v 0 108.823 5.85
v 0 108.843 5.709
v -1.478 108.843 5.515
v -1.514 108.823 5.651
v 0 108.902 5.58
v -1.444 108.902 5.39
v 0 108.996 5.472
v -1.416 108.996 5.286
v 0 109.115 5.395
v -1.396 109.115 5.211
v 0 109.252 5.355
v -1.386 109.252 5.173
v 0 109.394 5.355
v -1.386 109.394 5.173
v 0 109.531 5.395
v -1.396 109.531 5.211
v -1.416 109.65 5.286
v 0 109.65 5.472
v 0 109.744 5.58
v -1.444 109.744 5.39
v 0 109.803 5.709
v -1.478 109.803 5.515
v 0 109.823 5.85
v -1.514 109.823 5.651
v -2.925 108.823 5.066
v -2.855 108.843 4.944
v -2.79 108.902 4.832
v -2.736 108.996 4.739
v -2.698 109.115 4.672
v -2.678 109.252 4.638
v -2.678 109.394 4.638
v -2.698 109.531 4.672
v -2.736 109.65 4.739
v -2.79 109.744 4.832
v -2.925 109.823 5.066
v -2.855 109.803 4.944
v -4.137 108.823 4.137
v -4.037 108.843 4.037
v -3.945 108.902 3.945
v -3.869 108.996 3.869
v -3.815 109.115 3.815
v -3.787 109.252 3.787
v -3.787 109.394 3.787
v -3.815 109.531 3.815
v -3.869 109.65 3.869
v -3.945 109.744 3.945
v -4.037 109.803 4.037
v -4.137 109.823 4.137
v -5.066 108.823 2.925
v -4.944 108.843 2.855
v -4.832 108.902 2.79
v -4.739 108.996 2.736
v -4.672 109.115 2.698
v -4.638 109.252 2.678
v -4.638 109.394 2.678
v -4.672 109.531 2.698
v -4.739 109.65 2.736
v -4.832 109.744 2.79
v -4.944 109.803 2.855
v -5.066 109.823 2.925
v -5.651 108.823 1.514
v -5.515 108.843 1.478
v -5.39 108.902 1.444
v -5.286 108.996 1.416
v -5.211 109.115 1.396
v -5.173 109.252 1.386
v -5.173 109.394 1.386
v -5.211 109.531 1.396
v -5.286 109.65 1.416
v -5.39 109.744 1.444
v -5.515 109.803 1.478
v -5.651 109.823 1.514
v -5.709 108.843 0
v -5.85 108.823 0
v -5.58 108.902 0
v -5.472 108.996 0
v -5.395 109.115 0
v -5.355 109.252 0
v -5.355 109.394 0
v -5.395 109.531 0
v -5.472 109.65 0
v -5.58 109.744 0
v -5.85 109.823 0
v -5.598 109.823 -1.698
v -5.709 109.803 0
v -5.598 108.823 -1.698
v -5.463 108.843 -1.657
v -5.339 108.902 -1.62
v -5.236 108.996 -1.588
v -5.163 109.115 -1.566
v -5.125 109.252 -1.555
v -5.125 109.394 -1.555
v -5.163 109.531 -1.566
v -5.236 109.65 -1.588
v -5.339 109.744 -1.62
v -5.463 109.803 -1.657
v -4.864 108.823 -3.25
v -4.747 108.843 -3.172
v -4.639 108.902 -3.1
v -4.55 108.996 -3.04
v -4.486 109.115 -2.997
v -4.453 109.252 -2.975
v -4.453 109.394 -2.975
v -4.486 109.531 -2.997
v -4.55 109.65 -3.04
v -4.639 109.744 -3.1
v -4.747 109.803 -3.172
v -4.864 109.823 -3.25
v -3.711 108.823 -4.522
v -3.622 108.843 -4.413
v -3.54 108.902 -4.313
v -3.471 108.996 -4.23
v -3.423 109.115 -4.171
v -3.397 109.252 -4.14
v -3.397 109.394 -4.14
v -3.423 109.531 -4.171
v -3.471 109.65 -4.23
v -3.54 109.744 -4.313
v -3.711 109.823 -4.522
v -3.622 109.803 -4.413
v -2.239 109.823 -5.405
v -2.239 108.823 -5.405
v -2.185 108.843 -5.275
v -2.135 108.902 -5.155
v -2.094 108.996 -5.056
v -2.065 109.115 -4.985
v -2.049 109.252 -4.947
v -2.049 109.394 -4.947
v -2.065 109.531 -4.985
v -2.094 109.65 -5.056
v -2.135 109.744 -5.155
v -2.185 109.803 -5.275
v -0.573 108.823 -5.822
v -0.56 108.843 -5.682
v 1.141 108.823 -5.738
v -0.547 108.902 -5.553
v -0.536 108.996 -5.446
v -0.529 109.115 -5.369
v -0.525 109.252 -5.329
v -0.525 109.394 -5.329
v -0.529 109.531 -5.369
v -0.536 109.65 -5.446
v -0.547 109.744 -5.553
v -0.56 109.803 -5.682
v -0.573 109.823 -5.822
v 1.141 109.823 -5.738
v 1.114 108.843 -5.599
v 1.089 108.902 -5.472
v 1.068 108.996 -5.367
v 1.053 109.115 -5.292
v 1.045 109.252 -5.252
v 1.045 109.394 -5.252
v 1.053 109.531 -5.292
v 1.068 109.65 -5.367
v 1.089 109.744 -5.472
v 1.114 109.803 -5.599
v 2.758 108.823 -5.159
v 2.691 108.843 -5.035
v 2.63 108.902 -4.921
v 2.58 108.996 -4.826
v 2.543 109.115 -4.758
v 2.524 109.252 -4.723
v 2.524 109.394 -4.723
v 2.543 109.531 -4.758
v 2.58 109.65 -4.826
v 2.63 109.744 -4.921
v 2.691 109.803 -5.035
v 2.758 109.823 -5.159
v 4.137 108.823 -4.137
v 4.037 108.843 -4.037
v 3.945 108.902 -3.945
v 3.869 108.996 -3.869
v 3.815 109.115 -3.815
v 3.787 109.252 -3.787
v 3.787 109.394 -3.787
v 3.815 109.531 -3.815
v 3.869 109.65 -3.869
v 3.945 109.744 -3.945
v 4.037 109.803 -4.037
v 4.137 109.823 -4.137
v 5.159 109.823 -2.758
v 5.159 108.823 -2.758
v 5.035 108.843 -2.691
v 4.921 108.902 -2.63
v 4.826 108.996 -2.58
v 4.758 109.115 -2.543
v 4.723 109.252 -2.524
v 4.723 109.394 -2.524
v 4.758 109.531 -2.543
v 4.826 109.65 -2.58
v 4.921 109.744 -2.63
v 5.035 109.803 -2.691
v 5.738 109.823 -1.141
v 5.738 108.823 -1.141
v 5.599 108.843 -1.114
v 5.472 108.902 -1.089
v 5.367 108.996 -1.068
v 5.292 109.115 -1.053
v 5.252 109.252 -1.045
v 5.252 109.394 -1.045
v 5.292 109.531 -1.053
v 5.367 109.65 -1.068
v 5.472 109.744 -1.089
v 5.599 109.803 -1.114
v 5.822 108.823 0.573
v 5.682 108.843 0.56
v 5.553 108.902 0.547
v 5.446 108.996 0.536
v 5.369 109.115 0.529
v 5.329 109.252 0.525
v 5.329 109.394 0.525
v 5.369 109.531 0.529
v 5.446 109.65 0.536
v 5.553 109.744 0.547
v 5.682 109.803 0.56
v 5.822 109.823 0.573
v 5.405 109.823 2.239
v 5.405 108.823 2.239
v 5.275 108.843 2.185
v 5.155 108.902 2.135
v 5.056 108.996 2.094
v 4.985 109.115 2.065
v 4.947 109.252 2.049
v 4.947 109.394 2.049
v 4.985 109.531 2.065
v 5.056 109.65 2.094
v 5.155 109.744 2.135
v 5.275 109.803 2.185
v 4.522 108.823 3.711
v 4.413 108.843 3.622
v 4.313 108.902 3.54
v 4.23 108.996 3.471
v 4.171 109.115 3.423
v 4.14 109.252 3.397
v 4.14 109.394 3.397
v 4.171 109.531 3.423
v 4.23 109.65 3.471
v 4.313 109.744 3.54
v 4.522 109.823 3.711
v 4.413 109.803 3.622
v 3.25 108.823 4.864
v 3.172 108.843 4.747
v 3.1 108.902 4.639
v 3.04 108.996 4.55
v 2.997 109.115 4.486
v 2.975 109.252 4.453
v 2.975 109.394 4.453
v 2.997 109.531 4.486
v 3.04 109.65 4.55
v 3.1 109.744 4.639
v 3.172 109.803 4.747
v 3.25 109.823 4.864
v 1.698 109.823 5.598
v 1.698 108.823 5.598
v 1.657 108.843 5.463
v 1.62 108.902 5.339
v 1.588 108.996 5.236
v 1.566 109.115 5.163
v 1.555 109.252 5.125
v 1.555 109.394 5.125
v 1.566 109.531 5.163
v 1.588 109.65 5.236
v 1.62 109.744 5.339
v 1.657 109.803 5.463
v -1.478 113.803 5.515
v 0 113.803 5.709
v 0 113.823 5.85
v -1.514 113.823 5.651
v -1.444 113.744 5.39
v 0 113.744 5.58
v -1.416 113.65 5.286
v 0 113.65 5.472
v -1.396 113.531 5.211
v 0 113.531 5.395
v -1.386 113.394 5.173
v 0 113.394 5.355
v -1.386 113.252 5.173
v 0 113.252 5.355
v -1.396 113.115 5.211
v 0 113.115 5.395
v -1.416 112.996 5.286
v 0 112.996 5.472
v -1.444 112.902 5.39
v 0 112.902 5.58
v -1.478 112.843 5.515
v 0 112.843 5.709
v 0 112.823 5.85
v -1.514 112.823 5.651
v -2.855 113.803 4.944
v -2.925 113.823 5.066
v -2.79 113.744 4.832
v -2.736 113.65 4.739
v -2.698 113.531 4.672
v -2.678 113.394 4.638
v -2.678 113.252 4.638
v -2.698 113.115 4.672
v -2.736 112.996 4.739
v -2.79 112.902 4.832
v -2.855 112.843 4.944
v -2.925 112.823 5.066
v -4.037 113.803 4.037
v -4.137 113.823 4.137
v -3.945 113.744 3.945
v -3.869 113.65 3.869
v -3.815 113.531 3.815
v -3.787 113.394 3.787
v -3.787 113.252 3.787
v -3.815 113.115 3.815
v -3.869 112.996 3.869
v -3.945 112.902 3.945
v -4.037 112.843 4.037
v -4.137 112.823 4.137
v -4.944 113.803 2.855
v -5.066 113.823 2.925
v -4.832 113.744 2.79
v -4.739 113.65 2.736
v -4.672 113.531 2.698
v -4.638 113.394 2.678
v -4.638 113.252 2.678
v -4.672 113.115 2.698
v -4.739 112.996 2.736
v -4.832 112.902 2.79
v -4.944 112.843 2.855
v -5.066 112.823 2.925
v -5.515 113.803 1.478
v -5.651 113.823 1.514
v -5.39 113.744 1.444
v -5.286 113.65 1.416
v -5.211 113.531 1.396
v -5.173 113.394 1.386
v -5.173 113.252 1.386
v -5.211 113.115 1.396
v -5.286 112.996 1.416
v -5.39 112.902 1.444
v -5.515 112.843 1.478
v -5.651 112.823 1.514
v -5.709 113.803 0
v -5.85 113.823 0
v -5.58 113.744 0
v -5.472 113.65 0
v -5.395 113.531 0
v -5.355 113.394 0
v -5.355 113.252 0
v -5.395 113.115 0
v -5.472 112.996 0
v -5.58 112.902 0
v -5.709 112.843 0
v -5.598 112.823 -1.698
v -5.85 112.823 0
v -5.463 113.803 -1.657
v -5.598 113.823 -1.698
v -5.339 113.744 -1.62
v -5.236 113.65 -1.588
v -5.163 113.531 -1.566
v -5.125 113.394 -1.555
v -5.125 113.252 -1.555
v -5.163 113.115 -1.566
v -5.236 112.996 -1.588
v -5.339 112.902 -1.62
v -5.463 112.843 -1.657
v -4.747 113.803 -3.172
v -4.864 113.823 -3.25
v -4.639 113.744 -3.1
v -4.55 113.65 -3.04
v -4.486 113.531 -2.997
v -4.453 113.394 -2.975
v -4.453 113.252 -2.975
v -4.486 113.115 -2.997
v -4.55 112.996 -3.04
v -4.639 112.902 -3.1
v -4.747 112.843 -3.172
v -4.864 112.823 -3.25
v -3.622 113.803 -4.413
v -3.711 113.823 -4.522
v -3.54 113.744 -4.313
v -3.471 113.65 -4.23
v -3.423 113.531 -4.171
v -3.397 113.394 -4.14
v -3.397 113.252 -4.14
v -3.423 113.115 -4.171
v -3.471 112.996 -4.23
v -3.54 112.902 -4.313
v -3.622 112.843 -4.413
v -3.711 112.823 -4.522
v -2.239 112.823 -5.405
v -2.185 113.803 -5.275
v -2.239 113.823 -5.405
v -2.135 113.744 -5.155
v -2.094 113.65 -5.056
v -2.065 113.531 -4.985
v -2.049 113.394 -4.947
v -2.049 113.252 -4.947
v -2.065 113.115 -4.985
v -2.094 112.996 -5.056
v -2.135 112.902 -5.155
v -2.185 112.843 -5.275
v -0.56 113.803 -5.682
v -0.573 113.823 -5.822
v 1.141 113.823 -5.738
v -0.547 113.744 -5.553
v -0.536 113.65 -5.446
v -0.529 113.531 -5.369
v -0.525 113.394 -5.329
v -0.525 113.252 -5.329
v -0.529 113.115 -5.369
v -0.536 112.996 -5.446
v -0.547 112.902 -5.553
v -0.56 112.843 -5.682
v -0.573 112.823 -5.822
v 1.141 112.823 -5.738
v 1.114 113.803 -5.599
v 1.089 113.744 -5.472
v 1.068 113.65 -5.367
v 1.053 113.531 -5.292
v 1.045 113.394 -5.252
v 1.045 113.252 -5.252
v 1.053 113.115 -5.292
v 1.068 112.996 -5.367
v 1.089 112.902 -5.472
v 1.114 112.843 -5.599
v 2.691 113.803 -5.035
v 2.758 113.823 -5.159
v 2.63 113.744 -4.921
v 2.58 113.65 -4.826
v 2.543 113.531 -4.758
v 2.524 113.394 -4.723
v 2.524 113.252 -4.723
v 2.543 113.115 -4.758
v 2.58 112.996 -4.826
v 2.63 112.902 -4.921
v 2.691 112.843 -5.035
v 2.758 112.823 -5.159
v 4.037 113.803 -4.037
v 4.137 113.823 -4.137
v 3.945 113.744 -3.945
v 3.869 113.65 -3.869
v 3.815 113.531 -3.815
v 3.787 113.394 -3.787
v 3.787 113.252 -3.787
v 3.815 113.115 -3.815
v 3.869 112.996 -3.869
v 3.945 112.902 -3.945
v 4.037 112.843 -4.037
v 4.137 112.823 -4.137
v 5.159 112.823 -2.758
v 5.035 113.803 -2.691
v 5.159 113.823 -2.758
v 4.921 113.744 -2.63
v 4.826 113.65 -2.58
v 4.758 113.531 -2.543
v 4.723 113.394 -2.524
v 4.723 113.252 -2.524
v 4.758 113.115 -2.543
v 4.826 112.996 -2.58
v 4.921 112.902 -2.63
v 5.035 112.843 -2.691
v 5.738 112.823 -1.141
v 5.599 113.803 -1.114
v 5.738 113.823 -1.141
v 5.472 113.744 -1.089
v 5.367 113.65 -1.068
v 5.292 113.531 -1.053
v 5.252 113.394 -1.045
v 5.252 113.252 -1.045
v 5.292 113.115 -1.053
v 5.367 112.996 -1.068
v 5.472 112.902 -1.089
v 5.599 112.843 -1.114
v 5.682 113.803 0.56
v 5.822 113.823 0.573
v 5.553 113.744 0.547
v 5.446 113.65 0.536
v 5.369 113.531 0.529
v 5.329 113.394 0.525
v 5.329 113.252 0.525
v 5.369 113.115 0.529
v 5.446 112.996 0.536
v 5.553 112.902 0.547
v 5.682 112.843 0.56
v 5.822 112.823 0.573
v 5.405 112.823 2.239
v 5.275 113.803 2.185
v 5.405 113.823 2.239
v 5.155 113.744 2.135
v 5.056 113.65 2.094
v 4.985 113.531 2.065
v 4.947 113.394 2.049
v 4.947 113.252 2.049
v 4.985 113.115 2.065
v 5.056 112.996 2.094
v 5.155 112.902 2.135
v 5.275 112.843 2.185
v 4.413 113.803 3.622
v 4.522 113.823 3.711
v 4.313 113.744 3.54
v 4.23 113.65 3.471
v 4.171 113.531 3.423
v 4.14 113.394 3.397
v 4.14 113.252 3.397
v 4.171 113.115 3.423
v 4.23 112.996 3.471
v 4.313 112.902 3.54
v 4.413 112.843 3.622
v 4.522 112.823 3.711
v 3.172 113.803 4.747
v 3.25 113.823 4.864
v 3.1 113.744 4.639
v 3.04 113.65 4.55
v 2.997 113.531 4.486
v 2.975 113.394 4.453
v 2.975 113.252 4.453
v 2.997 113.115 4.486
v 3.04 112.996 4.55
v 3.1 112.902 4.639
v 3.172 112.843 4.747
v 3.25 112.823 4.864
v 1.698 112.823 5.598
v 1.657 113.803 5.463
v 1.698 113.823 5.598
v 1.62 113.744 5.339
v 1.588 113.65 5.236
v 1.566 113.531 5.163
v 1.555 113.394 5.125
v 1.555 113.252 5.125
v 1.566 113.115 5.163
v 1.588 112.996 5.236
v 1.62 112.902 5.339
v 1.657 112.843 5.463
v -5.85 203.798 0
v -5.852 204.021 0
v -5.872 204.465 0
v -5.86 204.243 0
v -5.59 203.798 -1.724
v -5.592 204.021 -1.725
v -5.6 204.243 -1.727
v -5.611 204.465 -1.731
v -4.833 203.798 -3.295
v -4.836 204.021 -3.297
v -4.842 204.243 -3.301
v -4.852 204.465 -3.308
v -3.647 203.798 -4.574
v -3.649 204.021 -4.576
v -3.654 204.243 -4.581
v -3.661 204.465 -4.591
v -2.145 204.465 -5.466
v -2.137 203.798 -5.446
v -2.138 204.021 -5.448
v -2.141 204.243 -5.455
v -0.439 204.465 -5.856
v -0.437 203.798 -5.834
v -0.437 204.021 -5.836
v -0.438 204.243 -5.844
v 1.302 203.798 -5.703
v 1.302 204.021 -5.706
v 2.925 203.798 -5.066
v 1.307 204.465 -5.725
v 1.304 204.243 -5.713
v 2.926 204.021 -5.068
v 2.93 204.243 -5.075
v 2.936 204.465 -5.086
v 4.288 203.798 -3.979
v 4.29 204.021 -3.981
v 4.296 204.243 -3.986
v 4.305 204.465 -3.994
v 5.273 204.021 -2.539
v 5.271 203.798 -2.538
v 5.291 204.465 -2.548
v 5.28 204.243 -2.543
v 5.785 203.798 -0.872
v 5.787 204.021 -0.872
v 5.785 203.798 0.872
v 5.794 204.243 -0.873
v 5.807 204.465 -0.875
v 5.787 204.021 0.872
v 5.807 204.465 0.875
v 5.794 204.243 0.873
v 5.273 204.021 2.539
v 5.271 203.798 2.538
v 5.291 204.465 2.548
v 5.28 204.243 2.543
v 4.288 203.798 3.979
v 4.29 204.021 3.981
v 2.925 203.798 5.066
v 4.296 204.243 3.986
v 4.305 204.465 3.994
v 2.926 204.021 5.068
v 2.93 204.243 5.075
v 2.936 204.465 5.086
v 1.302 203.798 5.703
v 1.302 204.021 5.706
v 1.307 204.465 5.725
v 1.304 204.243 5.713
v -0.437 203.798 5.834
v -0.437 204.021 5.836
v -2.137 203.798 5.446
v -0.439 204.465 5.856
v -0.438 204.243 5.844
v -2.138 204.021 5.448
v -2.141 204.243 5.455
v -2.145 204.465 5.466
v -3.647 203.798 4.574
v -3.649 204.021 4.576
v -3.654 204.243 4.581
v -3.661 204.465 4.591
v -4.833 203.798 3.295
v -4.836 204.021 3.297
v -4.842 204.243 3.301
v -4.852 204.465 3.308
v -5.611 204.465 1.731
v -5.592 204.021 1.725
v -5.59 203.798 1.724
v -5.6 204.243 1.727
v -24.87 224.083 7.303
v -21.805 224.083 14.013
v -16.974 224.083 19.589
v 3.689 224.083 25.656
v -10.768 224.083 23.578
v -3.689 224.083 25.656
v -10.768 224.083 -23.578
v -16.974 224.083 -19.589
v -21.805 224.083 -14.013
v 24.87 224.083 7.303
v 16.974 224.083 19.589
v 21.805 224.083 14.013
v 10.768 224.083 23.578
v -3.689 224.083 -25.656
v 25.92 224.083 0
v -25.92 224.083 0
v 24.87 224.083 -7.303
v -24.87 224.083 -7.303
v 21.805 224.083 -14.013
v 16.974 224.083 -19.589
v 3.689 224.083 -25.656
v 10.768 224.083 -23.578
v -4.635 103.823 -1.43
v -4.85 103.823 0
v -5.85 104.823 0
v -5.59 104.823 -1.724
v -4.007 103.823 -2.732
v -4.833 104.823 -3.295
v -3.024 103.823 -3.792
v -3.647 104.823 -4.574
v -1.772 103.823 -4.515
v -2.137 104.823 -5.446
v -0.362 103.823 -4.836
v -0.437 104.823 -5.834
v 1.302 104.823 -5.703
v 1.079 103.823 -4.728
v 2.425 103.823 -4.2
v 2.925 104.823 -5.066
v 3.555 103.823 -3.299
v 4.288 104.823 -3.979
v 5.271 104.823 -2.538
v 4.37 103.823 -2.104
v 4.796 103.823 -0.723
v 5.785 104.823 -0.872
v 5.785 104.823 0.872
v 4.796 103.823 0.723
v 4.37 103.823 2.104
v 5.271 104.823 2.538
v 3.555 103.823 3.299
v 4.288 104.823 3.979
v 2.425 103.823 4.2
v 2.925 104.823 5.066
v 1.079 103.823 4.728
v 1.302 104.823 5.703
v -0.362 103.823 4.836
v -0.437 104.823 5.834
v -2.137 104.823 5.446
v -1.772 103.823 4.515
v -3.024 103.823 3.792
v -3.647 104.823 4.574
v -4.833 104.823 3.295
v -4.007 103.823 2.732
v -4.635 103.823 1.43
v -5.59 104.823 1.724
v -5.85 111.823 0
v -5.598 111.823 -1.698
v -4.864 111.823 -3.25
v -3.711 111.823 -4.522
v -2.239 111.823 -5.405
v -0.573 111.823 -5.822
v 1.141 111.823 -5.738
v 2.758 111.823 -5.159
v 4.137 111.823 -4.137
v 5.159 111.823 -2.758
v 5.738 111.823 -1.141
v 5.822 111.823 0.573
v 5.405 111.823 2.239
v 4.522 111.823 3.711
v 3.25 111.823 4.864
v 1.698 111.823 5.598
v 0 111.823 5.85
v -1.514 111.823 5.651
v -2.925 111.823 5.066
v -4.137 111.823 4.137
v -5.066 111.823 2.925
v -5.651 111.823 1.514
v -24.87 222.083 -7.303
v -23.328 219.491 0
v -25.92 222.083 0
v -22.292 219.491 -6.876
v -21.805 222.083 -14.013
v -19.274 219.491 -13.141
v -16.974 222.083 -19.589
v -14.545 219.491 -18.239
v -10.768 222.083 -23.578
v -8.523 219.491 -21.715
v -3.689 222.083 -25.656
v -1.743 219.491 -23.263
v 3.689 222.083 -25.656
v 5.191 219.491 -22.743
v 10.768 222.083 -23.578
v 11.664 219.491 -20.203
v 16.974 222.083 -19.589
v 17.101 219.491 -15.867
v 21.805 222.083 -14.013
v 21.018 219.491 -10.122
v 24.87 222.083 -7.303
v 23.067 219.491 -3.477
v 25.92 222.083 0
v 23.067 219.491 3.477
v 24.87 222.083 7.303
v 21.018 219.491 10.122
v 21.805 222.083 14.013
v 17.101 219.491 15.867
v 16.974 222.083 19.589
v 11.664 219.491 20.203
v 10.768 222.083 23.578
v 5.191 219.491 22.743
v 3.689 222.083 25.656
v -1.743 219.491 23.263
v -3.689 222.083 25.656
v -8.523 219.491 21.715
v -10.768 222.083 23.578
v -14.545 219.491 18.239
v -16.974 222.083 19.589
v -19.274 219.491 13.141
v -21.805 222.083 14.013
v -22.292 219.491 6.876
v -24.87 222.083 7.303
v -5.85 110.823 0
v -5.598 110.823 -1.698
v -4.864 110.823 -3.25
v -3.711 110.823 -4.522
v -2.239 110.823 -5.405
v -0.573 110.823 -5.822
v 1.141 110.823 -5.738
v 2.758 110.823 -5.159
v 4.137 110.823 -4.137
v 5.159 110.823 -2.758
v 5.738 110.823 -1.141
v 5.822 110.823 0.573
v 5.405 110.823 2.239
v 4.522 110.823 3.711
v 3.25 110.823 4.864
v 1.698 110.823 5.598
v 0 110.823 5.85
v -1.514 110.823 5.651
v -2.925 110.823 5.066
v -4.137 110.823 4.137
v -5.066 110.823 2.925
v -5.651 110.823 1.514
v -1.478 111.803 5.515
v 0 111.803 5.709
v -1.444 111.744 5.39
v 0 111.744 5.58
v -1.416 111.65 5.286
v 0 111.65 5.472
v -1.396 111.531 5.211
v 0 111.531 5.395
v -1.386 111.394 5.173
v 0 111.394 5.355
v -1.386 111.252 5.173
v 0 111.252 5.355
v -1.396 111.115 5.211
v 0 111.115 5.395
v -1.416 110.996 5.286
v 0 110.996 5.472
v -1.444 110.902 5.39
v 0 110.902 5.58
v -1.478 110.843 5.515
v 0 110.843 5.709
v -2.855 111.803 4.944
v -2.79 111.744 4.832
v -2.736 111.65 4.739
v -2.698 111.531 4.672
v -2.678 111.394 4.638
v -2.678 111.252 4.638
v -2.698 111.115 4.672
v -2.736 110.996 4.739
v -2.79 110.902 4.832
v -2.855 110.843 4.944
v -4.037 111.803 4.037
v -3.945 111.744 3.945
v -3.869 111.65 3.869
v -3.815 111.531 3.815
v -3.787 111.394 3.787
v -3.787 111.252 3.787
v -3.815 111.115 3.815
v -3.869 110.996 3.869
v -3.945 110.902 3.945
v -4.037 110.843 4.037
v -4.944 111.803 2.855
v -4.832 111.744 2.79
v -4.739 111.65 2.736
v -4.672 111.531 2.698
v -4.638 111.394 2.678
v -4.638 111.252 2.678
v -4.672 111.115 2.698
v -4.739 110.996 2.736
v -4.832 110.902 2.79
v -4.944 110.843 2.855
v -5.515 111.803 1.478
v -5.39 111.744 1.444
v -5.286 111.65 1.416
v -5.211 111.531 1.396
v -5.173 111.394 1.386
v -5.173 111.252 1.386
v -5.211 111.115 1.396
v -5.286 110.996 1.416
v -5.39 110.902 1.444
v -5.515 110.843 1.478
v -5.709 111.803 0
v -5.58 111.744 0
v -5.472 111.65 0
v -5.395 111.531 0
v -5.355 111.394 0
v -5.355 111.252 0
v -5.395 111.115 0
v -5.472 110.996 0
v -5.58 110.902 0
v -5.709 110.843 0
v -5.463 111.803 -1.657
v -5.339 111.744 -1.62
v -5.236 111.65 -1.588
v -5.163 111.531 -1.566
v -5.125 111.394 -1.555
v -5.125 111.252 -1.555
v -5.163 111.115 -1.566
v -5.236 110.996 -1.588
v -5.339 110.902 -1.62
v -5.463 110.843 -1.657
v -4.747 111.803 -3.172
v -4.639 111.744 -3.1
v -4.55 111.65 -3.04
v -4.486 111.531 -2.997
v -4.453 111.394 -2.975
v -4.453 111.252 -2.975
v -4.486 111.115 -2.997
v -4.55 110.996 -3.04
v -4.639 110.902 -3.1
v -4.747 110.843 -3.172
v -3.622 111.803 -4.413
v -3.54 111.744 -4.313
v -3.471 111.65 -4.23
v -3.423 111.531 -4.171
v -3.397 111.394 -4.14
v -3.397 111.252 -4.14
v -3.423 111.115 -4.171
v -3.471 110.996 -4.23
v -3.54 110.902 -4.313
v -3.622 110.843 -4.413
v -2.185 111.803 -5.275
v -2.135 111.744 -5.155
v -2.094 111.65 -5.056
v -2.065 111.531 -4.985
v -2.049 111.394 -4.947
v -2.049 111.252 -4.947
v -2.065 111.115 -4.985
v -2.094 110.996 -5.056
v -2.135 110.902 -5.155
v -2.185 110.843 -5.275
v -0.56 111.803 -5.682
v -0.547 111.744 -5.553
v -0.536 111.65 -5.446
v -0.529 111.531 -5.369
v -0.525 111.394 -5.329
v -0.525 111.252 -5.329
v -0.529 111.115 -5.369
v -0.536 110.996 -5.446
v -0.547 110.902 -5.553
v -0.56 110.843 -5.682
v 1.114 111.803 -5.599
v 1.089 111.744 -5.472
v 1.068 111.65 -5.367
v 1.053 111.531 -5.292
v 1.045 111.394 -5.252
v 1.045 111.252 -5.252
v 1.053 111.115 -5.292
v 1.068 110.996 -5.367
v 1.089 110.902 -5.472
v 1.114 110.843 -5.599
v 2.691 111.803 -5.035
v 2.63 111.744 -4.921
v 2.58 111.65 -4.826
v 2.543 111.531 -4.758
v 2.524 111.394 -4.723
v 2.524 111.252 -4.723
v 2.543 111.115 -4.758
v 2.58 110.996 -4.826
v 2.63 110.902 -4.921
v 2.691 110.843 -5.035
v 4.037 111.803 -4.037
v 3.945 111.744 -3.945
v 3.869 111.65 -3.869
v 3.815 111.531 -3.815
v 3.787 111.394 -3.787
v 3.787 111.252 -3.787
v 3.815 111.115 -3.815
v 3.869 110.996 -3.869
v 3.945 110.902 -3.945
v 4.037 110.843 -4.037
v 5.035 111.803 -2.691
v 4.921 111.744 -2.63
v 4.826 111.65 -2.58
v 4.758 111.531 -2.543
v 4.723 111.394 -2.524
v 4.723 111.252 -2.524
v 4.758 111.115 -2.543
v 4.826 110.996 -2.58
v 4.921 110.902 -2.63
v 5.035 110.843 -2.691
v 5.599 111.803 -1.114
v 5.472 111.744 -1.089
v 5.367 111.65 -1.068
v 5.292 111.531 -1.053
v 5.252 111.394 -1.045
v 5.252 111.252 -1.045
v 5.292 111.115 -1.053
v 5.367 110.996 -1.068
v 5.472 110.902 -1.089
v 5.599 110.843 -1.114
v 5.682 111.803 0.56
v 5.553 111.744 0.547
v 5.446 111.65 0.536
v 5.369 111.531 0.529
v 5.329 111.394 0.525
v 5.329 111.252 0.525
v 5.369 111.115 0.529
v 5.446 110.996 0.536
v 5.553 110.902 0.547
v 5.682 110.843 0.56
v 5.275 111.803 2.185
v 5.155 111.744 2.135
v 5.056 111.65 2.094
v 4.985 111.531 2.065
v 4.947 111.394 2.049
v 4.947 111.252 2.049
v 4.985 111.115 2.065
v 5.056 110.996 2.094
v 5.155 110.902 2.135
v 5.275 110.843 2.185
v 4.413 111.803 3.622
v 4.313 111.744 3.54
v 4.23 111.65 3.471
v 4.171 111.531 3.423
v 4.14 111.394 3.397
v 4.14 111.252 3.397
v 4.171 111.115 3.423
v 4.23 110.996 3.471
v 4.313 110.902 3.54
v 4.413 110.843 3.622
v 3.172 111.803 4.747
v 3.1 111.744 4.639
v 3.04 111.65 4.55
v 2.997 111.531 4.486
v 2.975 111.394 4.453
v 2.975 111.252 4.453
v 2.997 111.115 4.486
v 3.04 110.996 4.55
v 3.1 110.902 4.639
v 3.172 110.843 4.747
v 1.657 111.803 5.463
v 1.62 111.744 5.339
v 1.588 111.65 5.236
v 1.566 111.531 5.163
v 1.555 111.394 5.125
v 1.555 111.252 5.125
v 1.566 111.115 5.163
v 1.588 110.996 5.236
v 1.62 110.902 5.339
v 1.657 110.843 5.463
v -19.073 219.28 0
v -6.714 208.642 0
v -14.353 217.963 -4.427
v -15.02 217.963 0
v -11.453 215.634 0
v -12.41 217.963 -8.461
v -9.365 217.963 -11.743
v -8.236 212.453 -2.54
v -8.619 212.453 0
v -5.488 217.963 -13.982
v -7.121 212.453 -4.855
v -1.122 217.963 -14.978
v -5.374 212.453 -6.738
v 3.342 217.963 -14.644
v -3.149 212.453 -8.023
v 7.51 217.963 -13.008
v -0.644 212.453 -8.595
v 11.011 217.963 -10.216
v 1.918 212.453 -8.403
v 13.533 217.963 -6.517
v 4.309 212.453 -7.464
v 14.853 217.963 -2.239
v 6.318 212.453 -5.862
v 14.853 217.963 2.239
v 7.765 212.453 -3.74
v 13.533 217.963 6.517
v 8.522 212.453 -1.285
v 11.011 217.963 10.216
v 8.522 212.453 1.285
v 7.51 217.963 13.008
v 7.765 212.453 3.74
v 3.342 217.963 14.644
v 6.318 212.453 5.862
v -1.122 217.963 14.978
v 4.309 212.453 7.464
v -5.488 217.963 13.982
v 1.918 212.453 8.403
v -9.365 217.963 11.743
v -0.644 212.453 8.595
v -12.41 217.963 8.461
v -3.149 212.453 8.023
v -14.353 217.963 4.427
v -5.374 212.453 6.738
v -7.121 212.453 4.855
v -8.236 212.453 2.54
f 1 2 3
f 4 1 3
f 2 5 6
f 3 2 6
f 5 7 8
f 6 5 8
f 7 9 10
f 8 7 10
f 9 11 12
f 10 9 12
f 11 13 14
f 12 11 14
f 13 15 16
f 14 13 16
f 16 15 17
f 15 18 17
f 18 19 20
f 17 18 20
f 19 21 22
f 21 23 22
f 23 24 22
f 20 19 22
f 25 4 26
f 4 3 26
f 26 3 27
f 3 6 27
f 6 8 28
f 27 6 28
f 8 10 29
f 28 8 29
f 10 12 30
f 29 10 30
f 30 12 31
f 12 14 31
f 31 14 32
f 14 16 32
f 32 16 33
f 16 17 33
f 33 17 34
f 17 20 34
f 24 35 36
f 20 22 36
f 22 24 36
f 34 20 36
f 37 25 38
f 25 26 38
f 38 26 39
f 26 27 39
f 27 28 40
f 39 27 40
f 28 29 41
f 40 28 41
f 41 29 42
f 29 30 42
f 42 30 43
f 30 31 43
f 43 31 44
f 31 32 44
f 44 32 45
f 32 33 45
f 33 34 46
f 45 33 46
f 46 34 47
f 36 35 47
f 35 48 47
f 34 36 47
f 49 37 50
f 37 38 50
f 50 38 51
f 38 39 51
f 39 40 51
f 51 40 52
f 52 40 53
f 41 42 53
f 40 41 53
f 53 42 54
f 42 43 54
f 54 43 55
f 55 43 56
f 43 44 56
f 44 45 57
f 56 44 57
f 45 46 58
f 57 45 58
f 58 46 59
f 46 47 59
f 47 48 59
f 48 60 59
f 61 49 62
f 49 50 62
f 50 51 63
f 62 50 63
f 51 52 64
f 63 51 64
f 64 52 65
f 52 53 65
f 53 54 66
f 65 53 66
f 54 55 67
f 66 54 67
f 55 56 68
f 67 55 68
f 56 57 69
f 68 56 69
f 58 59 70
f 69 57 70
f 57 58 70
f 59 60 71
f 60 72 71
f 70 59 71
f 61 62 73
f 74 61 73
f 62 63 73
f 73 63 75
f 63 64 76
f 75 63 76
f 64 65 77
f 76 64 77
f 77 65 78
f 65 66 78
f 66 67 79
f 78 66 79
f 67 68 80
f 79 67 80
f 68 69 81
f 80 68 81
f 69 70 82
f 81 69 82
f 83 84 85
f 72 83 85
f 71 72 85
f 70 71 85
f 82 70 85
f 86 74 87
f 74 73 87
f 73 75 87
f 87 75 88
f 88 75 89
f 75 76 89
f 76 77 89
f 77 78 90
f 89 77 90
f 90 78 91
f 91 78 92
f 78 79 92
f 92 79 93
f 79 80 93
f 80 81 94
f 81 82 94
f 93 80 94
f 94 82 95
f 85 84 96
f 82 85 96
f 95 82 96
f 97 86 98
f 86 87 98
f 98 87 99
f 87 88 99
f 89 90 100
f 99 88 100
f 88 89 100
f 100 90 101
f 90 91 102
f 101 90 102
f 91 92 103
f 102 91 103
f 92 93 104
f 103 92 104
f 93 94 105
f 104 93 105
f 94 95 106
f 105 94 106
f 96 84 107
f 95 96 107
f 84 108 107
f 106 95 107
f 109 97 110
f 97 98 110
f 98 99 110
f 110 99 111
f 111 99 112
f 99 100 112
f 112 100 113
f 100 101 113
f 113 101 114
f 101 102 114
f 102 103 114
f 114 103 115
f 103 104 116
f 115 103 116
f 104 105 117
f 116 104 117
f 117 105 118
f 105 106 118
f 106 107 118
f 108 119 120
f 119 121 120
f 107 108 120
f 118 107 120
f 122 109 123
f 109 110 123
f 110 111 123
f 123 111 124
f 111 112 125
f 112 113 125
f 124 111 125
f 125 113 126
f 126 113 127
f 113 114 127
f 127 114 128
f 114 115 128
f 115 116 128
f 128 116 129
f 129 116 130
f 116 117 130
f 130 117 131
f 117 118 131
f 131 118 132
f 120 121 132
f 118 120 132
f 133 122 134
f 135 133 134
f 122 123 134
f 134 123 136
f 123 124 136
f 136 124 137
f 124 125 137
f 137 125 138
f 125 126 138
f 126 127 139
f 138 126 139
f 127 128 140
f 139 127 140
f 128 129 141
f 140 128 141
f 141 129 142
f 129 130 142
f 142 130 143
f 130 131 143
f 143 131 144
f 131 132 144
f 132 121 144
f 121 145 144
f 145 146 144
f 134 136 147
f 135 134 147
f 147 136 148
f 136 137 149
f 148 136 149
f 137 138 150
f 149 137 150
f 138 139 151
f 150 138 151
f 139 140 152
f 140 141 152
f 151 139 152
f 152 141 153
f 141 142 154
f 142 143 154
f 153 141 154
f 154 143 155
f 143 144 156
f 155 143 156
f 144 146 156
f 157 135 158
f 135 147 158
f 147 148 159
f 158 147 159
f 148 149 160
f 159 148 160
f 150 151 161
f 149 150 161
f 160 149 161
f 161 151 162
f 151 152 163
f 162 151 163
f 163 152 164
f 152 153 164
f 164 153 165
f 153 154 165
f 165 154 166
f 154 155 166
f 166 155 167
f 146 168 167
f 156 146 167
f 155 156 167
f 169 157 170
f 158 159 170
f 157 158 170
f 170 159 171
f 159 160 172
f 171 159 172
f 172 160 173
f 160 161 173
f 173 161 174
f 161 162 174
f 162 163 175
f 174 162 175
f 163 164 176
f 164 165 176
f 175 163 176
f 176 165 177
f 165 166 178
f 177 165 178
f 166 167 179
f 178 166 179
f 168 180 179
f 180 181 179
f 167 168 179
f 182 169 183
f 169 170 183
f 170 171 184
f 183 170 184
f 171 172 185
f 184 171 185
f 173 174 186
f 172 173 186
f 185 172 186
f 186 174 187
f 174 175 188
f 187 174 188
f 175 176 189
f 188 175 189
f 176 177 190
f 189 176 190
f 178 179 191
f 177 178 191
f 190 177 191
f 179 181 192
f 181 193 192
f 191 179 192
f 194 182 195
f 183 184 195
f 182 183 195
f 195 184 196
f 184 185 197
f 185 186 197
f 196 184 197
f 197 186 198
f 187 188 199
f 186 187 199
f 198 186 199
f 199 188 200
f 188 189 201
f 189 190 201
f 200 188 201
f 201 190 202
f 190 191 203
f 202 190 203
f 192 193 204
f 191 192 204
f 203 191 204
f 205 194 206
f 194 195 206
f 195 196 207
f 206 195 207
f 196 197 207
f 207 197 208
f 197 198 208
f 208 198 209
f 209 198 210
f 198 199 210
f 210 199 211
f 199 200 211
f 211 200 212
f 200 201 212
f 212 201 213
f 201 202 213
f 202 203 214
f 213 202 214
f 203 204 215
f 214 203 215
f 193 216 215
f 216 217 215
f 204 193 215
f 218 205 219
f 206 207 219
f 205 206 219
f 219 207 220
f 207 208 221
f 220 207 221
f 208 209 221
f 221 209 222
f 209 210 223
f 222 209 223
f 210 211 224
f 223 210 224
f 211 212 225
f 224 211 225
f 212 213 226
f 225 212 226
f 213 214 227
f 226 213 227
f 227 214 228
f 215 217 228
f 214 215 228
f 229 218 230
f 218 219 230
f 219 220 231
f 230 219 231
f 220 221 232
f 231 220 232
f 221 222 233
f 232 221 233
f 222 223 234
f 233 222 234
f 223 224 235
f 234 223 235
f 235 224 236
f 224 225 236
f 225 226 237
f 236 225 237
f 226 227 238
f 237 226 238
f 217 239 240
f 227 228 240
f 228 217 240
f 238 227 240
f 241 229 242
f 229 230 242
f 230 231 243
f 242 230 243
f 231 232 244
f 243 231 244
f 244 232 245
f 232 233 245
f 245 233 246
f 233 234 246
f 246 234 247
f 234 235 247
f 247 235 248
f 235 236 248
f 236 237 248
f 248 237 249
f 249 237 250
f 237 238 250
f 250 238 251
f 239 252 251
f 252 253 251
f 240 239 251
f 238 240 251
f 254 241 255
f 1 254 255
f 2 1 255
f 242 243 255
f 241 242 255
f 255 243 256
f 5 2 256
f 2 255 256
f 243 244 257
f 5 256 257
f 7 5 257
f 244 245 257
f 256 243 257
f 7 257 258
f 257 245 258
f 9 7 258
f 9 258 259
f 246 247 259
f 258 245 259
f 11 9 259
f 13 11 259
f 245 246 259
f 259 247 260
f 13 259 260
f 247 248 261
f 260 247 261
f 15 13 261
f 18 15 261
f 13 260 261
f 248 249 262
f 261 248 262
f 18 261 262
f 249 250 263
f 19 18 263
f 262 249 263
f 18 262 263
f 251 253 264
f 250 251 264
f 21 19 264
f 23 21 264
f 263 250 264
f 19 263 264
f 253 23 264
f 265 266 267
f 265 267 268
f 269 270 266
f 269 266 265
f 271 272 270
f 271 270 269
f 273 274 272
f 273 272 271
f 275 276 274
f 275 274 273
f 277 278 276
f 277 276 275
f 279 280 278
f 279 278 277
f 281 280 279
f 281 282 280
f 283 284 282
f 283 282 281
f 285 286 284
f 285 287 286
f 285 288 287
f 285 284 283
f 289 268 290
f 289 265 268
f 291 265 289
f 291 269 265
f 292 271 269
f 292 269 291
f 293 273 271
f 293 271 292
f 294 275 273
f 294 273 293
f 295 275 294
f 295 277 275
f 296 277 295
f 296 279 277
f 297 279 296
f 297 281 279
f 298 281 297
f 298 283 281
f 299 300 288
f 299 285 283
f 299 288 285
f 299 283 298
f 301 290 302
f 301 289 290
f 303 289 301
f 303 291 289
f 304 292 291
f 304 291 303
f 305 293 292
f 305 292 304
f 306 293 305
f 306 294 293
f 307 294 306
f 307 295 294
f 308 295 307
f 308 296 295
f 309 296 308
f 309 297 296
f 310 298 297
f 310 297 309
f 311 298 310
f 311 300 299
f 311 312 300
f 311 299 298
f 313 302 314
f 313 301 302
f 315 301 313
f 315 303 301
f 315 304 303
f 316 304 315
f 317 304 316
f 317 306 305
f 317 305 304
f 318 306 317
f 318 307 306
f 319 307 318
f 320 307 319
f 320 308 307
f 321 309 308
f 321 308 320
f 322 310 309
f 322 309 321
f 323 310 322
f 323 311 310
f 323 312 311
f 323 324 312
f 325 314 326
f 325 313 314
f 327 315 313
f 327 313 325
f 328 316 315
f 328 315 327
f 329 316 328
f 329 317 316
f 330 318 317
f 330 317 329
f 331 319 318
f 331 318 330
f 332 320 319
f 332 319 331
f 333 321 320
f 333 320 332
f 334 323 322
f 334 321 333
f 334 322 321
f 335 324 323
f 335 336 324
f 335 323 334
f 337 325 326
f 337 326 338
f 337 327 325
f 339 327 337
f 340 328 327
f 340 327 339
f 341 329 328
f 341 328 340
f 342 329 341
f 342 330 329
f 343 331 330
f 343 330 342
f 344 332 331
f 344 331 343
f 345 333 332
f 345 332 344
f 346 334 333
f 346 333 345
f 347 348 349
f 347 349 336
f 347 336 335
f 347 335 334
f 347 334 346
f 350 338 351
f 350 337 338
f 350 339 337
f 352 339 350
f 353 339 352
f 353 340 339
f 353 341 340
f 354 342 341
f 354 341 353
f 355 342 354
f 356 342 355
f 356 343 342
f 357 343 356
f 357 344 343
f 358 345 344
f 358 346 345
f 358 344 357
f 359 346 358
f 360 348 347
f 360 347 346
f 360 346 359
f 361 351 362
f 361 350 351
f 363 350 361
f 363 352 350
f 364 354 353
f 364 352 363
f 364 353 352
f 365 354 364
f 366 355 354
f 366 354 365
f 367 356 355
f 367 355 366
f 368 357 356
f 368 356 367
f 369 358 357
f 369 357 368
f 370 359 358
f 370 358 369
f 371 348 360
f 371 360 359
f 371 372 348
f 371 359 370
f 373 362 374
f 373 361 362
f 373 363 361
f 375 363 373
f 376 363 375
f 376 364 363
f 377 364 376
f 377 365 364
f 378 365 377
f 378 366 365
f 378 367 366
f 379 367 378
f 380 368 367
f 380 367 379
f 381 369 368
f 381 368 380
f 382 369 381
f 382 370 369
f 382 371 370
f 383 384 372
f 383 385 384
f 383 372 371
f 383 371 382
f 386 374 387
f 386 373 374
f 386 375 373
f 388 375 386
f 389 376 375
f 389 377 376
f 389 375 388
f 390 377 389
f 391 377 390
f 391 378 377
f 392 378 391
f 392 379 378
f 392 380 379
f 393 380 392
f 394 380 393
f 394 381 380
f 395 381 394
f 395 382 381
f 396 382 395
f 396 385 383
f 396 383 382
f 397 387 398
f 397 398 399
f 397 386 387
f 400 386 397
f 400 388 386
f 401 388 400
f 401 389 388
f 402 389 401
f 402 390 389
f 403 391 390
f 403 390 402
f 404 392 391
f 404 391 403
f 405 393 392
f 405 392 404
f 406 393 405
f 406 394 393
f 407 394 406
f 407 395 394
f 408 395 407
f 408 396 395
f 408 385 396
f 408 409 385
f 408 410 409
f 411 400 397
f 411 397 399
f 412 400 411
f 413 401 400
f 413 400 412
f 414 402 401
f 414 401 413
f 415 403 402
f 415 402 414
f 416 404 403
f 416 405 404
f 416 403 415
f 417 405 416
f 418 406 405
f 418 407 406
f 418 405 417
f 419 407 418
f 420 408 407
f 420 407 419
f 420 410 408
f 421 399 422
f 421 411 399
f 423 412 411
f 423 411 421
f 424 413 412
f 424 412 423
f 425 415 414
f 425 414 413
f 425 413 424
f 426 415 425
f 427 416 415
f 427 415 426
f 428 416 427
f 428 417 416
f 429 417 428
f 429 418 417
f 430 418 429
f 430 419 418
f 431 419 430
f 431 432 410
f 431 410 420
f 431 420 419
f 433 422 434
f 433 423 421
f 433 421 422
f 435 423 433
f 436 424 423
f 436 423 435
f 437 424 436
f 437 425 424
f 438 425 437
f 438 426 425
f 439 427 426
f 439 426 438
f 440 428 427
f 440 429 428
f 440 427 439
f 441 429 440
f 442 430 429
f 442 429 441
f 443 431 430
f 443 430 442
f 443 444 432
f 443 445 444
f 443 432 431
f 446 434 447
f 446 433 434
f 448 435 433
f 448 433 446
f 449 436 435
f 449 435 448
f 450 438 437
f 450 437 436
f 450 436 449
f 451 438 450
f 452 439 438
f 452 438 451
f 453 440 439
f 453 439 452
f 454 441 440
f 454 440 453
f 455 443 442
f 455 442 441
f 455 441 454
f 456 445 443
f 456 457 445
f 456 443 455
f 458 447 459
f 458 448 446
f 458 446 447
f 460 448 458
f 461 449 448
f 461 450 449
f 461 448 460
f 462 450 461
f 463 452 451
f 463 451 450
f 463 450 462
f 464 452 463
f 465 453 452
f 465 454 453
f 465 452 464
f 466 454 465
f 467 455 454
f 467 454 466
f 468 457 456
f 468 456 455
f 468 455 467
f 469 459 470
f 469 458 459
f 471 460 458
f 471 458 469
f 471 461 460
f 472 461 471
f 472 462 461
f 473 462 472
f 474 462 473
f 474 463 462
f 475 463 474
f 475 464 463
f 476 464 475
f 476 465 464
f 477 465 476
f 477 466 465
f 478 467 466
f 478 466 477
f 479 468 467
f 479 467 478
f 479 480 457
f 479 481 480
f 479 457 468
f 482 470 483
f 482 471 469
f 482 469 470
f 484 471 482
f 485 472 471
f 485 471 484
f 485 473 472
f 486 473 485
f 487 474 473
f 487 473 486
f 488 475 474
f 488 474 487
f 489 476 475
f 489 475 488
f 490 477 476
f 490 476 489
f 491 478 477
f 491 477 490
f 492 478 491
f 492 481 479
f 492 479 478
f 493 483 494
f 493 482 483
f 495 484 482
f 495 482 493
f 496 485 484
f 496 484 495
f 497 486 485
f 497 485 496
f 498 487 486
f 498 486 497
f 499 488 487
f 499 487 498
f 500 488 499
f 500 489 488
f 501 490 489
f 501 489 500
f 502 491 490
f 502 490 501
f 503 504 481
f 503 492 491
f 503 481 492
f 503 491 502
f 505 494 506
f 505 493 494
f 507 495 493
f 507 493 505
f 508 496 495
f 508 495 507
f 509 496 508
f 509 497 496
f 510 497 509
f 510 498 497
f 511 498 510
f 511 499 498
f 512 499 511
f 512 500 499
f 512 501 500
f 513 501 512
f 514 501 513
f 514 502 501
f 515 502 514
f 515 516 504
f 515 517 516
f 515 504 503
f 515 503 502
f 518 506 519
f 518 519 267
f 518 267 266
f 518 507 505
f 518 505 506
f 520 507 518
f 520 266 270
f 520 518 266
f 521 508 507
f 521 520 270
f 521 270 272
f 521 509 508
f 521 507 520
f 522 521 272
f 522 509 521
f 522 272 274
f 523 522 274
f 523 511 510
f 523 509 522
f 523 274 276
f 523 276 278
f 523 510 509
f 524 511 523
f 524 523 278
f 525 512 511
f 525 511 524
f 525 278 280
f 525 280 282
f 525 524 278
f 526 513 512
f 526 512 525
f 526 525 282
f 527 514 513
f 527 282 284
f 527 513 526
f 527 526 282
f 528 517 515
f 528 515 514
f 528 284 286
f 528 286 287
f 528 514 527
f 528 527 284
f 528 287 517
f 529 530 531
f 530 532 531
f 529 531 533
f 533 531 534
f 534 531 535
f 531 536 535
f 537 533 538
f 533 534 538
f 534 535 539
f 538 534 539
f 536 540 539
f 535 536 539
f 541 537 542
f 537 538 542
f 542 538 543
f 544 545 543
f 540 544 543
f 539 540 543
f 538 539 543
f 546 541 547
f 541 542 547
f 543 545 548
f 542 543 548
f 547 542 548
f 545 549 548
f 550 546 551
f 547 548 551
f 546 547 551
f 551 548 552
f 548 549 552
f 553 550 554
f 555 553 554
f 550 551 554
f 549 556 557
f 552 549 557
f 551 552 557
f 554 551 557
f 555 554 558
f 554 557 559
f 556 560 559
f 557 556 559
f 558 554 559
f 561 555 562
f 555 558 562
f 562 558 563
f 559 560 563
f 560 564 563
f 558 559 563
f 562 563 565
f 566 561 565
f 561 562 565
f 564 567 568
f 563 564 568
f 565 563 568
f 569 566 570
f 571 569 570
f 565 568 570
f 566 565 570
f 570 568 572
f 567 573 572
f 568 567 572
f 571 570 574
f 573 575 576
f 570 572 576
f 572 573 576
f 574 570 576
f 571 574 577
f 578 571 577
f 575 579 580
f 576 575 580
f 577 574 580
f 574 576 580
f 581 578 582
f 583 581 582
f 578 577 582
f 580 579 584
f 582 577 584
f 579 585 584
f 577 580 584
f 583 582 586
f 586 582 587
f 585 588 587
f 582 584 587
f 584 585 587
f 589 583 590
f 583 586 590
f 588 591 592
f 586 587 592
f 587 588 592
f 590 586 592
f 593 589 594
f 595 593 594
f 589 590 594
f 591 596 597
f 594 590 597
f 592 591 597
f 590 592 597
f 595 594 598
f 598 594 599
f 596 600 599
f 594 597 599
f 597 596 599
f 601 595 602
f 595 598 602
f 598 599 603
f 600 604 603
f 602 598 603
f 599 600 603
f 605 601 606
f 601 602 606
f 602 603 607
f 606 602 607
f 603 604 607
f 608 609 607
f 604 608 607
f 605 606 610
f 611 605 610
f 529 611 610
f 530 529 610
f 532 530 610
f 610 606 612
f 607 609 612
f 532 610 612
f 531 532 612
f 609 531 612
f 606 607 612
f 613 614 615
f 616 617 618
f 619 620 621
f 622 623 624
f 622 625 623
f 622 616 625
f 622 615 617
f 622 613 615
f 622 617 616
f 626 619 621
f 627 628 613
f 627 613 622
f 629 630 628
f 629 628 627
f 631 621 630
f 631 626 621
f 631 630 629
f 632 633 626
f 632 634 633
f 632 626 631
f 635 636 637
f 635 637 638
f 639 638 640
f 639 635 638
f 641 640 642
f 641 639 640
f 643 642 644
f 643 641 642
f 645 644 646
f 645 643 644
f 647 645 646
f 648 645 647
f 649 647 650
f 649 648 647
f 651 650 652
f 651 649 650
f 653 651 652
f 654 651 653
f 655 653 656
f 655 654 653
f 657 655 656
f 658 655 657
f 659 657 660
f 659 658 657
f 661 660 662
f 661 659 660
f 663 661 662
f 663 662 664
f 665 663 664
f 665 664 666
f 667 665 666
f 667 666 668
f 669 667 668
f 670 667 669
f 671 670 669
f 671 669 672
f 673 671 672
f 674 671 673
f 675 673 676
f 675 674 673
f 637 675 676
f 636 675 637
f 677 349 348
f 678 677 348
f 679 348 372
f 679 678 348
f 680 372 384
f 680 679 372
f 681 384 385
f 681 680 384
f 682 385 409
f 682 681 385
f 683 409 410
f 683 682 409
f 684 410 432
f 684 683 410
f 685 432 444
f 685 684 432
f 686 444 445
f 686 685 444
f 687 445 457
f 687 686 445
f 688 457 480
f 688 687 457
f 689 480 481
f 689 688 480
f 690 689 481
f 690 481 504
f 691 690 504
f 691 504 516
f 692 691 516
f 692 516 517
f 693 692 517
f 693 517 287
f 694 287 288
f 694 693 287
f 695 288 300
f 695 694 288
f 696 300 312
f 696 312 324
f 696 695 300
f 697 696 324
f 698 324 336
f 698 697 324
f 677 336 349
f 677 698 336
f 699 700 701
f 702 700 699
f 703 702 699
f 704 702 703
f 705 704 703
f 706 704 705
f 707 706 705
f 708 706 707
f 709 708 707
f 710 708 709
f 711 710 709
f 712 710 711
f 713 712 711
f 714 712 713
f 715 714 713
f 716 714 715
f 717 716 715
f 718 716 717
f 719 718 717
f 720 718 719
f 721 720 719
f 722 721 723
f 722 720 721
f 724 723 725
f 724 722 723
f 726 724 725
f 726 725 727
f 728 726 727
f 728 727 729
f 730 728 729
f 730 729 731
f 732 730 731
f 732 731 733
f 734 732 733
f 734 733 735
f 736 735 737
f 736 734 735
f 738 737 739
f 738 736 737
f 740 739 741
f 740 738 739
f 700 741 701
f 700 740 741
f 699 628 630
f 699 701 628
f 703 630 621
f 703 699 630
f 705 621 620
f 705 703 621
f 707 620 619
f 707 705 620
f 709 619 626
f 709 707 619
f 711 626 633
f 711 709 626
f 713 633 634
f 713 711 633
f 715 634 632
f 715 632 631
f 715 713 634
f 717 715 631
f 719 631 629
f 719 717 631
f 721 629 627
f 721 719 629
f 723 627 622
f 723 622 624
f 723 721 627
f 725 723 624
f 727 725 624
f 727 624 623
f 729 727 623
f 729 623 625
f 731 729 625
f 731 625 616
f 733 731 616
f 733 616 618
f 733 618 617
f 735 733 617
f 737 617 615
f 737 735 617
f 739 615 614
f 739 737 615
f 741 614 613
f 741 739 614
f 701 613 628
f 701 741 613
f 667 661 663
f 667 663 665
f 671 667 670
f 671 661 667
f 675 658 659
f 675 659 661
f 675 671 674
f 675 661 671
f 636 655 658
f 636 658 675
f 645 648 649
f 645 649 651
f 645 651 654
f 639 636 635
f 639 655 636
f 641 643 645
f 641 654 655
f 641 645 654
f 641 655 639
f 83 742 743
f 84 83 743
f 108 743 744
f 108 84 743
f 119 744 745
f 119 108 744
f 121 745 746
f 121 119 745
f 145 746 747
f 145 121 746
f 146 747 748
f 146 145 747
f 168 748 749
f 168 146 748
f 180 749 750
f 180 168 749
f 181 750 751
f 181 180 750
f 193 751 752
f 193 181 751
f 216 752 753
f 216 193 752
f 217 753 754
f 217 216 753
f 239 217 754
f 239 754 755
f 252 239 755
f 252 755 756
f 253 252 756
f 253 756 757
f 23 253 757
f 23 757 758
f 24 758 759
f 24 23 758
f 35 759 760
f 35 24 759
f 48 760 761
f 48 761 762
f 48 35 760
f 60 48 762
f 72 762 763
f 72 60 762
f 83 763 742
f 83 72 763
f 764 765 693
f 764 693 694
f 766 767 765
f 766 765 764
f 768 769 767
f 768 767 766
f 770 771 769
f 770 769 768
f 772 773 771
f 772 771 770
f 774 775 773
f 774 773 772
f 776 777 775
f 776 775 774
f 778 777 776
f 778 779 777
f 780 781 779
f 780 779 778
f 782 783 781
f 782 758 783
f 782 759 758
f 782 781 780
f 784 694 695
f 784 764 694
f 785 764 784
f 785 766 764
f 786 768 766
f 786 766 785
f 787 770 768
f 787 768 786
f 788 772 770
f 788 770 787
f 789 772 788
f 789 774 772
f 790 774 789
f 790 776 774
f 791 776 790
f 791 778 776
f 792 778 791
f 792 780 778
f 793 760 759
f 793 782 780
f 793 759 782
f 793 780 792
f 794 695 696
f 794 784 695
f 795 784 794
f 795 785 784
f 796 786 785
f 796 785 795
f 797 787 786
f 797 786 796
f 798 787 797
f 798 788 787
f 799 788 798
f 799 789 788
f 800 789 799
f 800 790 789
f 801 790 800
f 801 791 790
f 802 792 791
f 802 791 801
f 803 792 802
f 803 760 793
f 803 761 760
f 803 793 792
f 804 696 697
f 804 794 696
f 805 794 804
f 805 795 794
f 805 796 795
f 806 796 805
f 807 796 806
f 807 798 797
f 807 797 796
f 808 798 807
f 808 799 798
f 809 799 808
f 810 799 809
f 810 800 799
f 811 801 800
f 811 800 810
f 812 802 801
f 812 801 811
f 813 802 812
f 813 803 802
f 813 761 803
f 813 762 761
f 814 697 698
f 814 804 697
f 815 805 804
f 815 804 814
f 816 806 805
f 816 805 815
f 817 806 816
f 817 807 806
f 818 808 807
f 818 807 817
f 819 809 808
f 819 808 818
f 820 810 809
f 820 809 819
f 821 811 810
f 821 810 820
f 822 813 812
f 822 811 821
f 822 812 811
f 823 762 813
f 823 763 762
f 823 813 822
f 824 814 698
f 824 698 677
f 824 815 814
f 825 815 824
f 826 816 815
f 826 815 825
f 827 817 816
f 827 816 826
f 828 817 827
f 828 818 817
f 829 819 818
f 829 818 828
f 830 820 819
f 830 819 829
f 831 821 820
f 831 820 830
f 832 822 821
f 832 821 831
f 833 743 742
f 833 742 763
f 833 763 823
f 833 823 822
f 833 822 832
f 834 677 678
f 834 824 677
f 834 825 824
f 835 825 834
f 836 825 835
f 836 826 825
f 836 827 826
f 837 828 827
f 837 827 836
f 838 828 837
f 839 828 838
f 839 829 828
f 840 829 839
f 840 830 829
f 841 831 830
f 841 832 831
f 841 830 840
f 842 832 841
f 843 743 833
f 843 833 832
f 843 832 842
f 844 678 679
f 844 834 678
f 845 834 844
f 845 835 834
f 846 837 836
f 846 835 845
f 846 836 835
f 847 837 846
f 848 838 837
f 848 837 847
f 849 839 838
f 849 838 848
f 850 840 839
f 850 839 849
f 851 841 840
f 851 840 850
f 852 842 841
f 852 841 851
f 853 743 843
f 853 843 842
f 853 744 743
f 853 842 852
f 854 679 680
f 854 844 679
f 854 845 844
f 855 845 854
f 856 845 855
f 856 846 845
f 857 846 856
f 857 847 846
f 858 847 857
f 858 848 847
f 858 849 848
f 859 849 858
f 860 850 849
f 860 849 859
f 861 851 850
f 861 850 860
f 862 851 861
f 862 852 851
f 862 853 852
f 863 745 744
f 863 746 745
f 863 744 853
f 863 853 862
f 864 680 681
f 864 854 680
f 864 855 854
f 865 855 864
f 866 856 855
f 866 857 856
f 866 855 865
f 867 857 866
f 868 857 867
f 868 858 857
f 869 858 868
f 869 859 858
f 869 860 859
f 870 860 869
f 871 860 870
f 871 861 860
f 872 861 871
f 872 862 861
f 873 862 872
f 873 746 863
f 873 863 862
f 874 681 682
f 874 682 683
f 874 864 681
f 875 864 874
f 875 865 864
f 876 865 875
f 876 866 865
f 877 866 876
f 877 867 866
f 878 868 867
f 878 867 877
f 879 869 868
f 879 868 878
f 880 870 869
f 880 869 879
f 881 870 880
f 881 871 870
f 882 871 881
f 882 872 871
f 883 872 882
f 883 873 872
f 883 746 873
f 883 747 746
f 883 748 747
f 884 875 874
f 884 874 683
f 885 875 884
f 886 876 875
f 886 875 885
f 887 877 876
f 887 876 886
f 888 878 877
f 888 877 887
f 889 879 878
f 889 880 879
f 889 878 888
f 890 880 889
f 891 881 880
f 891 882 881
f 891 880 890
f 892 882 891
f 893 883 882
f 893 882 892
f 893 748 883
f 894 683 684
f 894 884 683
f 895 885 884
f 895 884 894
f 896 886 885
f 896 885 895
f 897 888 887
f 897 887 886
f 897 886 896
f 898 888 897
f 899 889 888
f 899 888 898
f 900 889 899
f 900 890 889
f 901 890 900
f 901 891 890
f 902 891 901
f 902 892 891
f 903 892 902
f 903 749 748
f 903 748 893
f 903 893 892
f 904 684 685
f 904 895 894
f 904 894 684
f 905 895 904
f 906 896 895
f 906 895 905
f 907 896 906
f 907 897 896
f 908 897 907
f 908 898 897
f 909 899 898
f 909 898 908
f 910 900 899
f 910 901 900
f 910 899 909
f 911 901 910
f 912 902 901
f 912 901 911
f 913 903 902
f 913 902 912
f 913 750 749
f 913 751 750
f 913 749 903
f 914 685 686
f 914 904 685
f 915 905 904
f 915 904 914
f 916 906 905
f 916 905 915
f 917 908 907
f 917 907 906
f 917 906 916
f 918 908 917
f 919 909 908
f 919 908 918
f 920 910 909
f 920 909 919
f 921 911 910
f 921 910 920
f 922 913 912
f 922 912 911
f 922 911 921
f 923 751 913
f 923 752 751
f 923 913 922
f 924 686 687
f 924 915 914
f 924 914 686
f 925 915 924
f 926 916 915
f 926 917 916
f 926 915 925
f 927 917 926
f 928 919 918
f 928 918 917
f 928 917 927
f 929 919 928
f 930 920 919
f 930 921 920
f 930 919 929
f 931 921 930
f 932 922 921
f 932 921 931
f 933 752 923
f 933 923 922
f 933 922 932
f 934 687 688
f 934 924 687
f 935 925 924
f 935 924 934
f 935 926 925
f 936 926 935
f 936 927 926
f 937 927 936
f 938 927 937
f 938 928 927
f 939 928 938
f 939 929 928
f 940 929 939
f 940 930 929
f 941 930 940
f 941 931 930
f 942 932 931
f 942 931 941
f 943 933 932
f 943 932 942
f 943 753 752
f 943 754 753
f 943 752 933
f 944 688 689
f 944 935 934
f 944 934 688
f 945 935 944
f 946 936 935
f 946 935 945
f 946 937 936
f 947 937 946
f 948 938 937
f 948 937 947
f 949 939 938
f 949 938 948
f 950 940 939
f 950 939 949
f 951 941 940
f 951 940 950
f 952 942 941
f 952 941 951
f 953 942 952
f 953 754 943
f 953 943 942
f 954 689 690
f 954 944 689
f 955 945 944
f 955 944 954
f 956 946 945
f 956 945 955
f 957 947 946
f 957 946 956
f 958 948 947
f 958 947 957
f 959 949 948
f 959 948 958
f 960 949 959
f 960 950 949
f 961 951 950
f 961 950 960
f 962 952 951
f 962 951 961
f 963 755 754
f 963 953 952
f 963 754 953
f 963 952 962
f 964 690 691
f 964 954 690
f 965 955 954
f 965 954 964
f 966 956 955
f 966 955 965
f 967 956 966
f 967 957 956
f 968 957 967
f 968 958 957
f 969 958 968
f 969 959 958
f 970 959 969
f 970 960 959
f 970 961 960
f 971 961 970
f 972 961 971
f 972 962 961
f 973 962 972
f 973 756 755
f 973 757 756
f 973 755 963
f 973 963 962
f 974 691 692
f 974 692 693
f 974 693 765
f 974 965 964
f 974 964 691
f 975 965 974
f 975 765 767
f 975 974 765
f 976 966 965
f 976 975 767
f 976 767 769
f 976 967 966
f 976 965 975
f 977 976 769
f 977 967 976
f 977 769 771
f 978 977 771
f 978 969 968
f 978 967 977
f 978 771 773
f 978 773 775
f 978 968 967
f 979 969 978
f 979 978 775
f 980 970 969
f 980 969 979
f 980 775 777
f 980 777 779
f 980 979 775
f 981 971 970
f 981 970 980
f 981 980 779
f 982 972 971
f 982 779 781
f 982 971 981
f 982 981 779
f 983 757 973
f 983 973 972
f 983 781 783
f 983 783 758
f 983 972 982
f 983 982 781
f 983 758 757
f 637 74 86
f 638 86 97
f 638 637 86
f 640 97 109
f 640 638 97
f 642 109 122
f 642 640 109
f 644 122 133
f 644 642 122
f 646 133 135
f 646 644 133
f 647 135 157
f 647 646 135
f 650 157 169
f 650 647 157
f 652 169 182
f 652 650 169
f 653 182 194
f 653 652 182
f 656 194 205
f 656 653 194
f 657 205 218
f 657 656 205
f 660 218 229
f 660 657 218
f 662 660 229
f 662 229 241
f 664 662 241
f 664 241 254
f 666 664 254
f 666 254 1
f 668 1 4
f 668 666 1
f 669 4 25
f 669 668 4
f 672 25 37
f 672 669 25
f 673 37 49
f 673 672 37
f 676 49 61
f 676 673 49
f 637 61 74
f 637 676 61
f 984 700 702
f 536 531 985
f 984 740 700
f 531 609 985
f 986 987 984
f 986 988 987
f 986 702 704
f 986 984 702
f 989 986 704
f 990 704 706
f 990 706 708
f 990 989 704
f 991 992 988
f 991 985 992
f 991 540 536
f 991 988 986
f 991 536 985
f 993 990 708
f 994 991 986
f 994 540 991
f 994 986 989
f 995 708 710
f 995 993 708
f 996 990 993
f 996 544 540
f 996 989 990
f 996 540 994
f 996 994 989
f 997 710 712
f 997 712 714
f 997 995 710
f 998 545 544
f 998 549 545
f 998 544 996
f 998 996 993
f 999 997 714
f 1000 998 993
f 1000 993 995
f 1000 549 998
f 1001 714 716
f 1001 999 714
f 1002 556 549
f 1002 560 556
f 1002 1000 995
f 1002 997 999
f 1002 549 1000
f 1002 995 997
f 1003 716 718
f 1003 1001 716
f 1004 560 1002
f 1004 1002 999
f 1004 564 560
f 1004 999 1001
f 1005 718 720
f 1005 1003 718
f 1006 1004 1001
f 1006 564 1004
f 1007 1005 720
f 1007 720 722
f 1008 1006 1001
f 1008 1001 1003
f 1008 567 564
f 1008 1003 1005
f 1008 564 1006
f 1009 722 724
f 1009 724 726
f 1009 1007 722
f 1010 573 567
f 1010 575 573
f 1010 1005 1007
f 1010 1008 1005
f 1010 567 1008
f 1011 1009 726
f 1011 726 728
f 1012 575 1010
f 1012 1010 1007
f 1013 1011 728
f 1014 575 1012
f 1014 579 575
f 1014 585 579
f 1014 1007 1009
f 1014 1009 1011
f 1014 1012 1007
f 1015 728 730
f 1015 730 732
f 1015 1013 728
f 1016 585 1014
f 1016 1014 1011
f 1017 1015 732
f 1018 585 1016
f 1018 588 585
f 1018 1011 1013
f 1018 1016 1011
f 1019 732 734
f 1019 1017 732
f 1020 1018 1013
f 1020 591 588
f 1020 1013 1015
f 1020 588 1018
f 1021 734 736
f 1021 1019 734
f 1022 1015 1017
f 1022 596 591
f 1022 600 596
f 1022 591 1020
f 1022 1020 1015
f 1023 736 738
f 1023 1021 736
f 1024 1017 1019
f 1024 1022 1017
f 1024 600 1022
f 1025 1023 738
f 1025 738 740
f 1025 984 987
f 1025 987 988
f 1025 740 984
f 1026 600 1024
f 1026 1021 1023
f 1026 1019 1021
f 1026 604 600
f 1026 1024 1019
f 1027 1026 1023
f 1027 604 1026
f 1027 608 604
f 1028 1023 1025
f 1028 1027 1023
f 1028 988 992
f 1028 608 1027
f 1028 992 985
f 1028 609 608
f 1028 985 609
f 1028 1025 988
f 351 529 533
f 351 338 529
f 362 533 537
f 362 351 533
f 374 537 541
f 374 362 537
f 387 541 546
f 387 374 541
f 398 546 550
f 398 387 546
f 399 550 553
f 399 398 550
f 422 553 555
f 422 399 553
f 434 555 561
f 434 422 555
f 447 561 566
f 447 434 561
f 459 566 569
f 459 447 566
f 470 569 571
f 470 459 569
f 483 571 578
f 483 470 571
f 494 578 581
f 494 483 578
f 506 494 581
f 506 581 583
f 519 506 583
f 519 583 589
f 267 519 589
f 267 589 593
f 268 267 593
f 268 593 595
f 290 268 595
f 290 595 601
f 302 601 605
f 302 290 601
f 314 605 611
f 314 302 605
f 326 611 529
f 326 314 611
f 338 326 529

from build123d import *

# Parameters (mm, degrees)
FILLET1_R     = 10
CHAMFER1_SIZE = 1


with BuildPart() as part:
    # Sketch1 → Revolve1 (revolve)
    with BuildSketch(Plane.XY):
        with BuildLine():
            Line((0, 224.082988103), (-25.92, 224.082988103))
            Line((-25.92, 224.082988103), (-25.92, 222.082988103))
            Line((-25.92, 222.082988103), (-23.328, 219.490988103))
            ThreePointArc((-23.328, 219.490988103), (-11.297623362, 215.498292086), (-5.85, 204.052988103))
            Line((-5.85, 204.052988103), (-5.85, 103.822988103))
            Line((-5.85, 103.822988103), (0, 103.822988103))
            Line((0, 103.822988103), (0, 224.082988103))
        make_face()
    revolve(axis=Axis((0, 224.082988103, 0), (0, -1, 0)))

    # Fillet1
    # the kernel refuses this fillet: 10 mm, written as the material it adds along each edge
    with BuildSketch(Plane(origin=(0, 204.052988103, 0), x_dir=(-1, 0, 0), z_dir=(0, 0, 1))) as fillet1_piece_1:
        with BuildLine():
            CenterArc((15.85, 0.254709409), FILLET1_R, 180, 3.822695193)
            Line((5.85, 0.254709409), (5.85, 0))
            ThreePointArc((5.85, 0), (5.85980933, -0.20606196), (5.872248615, -0.411981893))
        make_face()
    revolve(axis=Axis((0, 204.052988103, 0), (0, -1, 0)))

    # Chamfer1
    chamfer1_edges = [part.edges().sort_by_distance(p)[0] for p in [
        (5.85, 103.822988103, 0),
    ]]
    chamfer(chamfer1_edges, length=CHAMFER1_SIZE)

    # Sketch5 → Cut-Revolve2 (revolve, cut)
    with BuildSketch(Plane(origin=(0, 0, 0), x_dir=(0, 0, -1), z_dir=(1, 0, 0))):
        with BuildLine():
            Line((-7.48, 111.822988103), (-5.85, 111.822988103))
            ThreePointArc((-5.85, 111.822988103), (-5.35, 111.322988103), (-5.85, 110.822988103))
            Line((-5.85, 110.822988103), (-7.48, 110.822988103))
            Line((-7.48, 110.822988103), (-7.48, 111.822988103))
        make_face()
        with BuildLine():
            Line((-7.48, 108.822988103), (-5.85, 108.822988103))
            ThreePointArc((-5.85, 108.822988103), (-5.35, 109.322988103), (-5.85, 109.822988103))
            Line((-5.85, 109.822988103), (-7.48, 109.822988103))
            Line((-7.48, 109.822988103), (-7.48, 108.822988103))
        make_face()
        with BuildLine():
            Line((-7.48, 113.822988103), (-5.85, 113.822988103))
            ThreePointArc((-5.85, 113.822988103), (-5.35, 113.322988103), (-5.85, 112.822988103))
            Line((-5.85, 112.822988103), (-7.48, 112.822988103))
            Line((-7.48, 112.822988103), (-7.48, 113.822988103))
        make_face()
    revolve(axis=Axis((0, 203.798278695, 0), (0, -1, 0)), mode=Mode.SUBTRACT)


solid = part.part
